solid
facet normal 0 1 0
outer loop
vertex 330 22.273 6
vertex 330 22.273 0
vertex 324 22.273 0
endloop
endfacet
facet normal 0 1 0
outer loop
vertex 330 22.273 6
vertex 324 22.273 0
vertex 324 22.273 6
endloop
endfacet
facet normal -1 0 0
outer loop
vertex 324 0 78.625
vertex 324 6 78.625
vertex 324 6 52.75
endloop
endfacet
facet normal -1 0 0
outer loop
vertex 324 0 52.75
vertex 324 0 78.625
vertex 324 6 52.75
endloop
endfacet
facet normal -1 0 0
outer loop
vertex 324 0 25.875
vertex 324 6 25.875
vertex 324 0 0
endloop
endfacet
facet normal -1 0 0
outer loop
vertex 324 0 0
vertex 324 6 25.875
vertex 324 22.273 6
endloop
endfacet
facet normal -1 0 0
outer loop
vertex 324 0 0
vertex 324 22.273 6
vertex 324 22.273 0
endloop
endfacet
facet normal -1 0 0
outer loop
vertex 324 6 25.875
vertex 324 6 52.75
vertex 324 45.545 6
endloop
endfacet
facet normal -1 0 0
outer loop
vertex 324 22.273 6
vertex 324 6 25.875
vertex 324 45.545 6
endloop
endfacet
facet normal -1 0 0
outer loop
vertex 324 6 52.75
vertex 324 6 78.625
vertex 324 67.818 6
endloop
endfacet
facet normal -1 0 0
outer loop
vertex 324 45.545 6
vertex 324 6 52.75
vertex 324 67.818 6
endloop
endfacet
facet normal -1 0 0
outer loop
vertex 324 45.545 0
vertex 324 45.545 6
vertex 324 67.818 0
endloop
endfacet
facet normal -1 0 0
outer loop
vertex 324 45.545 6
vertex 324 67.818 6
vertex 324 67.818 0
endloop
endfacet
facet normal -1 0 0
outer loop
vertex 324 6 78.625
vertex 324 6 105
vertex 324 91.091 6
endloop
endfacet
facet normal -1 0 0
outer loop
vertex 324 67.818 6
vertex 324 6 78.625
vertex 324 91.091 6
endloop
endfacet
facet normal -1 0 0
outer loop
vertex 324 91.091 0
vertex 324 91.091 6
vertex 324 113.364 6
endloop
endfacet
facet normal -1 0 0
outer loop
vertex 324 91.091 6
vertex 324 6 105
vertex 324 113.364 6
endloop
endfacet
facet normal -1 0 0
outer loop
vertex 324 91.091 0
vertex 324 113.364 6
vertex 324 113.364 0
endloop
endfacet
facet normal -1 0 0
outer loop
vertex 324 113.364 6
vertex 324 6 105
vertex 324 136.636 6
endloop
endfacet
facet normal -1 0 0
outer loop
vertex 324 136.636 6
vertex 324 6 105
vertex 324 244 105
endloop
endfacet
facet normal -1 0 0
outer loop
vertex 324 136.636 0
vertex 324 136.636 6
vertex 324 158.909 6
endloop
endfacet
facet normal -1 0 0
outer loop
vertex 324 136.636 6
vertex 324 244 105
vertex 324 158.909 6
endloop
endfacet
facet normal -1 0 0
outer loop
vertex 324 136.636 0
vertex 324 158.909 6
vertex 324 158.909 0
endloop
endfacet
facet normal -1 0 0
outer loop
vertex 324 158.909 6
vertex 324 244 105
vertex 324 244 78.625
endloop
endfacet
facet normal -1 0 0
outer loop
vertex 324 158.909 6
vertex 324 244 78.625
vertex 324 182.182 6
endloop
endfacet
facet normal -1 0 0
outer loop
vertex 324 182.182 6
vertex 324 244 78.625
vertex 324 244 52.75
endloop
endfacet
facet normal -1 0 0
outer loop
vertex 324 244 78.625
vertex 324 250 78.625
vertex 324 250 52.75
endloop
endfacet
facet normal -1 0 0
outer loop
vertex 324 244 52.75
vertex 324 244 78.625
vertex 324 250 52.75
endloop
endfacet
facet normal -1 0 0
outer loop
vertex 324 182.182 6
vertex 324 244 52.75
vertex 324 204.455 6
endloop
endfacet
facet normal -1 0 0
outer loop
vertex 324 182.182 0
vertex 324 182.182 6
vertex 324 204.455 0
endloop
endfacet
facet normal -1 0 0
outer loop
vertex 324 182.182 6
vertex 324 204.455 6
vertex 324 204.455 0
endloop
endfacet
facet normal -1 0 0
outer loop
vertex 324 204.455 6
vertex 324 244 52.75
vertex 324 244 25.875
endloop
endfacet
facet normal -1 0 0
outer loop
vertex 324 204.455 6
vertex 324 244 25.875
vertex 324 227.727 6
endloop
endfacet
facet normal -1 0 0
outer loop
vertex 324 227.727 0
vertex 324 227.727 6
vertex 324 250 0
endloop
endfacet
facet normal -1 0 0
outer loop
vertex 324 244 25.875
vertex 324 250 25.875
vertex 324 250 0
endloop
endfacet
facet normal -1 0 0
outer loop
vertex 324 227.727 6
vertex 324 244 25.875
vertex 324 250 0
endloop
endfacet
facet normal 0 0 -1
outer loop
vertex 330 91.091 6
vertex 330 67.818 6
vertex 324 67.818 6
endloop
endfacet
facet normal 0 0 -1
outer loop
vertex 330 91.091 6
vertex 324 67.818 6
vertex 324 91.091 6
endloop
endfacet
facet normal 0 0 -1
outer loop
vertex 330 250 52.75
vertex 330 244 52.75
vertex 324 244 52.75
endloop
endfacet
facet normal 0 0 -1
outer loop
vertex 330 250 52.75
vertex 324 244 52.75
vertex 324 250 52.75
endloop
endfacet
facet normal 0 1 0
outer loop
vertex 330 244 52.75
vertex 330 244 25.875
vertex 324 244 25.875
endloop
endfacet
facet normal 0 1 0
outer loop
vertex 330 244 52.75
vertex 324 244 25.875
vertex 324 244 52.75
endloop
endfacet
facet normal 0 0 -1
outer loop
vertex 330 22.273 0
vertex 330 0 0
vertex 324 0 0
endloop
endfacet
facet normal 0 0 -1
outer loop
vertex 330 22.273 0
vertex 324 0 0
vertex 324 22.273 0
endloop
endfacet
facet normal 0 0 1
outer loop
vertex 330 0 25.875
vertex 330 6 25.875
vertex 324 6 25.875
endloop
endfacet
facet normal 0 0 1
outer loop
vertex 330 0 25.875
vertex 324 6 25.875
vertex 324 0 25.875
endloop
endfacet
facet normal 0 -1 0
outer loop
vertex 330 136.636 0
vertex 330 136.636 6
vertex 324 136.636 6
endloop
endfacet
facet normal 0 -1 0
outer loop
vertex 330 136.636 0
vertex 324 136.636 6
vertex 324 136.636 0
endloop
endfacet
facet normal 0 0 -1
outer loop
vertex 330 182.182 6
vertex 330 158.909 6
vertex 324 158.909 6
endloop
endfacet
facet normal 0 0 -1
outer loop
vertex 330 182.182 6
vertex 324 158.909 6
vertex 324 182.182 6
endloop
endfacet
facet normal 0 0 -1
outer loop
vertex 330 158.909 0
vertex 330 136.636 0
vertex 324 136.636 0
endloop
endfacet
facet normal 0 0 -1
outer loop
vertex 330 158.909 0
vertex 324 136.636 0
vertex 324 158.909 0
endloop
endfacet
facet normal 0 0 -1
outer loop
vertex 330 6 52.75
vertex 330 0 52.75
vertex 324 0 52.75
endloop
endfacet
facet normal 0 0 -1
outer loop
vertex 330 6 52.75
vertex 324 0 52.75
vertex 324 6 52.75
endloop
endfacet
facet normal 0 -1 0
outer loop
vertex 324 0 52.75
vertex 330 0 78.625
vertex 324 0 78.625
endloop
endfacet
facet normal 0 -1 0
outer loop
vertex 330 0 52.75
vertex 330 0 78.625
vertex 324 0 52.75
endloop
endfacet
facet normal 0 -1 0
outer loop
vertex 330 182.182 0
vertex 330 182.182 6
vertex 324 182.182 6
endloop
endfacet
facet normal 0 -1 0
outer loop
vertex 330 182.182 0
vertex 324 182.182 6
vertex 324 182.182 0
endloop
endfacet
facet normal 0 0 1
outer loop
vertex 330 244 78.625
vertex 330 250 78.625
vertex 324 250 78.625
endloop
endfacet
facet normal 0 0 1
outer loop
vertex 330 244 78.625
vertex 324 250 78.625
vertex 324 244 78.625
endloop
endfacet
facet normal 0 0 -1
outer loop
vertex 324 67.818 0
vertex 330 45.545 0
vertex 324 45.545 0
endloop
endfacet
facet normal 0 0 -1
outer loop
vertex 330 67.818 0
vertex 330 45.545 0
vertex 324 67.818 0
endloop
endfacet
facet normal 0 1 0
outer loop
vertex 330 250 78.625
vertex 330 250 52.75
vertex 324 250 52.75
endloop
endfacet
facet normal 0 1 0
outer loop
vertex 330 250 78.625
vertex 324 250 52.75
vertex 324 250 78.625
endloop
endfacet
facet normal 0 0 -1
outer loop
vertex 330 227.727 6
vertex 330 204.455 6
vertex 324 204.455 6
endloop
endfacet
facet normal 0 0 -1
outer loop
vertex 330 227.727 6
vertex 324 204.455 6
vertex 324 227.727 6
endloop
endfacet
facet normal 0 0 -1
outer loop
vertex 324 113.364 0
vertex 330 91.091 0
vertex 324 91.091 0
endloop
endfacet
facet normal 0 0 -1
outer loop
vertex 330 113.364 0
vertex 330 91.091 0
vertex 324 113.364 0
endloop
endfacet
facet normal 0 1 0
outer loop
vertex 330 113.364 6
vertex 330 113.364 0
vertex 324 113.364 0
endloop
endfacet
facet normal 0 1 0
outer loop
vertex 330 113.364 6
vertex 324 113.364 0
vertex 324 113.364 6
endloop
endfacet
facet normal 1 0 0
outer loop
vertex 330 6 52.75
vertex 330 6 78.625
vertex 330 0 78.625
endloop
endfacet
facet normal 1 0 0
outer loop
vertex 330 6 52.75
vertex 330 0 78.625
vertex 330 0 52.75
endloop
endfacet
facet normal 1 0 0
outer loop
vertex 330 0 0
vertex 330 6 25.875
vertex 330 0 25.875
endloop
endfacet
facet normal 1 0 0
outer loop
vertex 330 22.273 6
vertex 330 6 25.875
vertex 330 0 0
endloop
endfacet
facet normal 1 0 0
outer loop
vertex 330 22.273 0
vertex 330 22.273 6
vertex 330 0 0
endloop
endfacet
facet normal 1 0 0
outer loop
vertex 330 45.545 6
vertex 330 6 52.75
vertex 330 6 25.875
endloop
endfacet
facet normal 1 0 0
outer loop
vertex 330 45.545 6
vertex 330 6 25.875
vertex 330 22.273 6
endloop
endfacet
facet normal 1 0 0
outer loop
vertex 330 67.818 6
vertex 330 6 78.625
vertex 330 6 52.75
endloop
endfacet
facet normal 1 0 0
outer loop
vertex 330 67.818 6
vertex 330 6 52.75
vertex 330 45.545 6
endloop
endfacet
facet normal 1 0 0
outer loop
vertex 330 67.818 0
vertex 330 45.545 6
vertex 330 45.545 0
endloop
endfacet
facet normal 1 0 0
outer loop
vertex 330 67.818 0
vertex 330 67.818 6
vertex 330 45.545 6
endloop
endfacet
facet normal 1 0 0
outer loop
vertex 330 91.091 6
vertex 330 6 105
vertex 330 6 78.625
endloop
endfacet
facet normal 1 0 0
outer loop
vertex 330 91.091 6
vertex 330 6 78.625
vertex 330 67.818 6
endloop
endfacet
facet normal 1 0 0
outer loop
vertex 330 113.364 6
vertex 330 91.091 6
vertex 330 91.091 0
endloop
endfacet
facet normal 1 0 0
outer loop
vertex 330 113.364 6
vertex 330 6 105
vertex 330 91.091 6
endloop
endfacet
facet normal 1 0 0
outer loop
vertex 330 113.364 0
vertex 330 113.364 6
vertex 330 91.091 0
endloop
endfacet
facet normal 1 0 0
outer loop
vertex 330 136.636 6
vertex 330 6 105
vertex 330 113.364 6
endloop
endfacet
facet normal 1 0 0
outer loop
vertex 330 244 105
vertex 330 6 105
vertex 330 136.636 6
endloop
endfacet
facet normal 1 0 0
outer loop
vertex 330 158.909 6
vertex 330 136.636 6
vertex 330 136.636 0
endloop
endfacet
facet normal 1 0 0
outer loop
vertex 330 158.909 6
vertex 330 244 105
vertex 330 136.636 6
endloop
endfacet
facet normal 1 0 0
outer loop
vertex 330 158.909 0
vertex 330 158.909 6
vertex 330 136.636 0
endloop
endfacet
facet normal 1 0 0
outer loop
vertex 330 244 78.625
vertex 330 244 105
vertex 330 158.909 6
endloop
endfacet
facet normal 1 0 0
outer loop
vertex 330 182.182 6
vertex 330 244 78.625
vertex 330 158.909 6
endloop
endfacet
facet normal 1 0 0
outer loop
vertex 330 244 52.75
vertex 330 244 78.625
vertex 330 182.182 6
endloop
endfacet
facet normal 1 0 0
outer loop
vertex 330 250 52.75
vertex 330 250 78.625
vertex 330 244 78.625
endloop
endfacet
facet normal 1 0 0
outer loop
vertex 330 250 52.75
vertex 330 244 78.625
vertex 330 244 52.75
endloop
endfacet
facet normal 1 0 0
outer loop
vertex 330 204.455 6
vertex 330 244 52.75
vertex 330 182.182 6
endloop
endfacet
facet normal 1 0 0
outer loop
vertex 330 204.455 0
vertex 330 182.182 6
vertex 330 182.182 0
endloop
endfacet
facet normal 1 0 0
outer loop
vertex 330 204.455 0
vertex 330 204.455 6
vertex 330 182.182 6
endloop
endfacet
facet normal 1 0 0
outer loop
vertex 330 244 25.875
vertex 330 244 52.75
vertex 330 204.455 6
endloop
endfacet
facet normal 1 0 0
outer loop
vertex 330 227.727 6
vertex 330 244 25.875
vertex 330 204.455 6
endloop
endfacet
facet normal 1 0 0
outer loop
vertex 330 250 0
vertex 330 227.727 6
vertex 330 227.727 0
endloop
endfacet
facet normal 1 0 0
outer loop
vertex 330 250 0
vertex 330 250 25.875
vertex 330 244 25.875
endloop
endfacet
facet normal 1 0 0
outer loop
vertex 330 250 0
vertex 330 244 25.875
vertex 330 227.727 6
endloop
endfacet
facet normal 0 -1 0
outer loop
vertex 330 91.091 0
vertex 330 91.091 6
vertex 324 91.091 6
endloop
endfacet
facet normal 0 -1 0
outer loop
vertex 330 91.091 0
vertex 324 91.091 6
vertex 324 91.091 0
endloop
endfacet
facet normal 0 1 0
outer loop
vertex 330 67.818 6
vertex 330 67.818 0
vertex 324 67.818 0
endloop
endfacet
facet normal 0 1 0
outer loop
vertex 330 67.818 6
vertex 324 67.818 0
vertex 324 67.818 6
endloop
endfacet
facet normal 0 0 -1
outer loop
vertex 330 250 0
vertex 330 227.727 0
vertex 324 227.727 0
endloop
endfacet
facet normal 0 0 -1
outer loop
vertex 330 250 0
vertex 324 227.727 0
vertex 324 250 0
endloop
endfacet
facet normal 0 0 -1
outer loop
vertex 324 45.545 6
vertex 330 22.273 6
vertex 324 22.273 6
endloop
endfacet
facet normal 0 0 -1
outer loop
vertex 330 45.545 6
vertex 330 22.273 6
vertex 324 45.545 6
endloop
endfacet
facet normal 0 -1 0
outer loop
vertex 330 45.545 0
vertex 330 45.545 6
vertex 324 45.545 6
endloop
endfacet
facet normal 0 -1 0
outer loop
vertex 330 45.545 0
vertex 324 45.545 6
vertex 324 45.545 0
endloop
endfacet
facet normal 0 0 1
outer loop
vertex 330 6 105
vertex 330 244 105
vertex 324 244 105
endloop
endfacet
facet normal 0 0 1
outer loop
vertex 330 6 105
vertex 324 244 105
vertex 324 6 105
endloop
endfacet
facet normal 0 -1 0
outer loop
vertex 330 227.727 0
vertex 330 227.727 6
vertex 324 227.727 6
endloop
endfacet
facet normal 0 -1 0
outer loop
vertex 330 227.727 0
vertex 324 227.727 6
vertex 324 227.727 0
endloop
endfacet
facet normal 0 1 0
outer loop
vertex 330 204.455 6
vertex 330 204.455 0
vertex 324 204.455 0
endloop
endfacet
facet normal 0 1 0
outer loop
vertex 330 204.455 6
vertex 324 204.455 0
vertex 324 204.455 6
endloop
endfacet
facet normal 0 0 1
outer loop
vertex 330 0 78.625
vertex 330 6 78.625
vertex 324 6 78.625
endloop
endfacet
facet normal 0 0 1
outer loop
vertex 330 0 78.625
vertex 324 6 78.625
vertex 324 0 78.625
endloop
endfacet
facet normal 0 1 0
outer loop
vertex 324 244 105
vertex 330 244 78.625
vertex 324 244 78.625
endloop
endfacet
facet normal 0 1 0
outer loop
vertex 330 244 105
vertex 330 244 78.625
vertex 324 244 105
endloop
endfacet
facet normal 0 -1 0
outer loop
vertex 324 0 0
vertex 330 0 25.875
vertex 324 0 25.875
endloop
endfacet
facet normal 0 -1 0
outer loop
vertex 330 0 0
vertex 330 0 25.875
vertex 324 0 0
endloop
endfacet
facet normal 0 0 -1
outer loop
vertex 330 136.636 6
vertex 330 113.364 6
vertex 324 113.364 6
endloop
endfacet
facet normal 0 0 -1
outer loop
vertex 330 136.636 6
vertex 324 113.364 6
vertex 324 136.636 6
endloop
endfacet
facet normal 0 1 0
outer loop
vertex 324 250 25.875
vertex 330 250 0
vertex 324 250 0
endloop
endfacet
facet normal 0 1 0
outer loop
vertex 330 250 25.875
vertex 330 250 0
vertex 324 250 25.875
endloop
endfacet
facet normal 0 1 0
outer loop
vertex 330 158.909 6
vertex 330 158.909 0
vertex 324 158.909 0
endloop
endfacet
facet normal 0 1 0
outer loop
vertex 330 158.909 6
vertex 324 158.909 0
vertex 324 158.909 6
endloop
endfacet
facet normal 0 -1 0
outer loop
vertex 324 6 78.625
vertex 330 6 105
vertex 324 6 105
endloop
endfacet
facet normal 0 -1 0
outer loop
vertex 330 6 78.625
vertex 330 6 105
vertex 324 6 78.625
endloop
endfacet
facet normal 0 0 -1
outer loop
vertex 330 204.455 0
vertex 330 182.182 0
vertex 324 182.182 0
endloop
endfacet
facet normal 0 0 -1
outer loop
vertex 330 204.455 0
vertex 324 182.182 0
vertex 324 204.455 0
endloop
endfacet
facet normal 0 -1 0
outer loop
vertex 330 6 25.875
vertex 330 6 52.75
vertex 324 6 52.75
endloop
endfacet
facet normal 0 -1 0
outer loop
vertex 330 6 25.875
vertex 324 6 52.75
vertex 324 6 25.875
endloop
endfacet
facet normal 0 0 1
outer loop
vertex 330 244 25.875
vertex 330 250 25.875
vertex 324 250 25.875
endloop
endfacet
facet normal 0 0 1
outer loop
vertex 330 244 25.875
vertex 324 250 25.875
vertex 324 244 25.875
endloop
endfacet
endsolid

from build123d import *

# Parameters (mm, degrees)
BOSS_EXTRUDE1_DEPTH = 6


with BuildPart() as part:
    # Sketch1 → Boss-Extrude1 (new body)
    with BuildSketch(Plane(origin=(330, 0, 0), x_dir=(0, 0, -1), z_dir=(1, 0, 0))):
        Polygon((-52.75, 244), (-52.75, 250), (-78.625, 250), (-78.625, 244), (-105, 244), (-105, 6), (-78.625, 6), (-78.625, 0), (-52.75, 0), (-52.75, 6), (-25.875, 6), (-25.875, 0), (0, 0), (0, 22.272727273), (-6, 22.272727273), (-6, 45.545454545), (0, 45.545454545), (0, 67.818181818), (-6, 67.818181818), (-6, 91.090909091), (0, 91.090909091), (0, 113.363636364), (-6, 113.363636364), (-6, 136.636363636), (0, 136.636363636), (0, 158.909090909), (-6, 158.909090909), (-6, 182.181818182), (0, 182.181818182), (0, 204.454545455), (-6, 204.454545455), (-6, 227.727272727), (0, 227.727272727), (0, 250), (-25.875, 250), (-25.875, 244), align=None)
    extrude(amount=-BOSS_EXTRUDE1_DEPTH)


solid = part.part
